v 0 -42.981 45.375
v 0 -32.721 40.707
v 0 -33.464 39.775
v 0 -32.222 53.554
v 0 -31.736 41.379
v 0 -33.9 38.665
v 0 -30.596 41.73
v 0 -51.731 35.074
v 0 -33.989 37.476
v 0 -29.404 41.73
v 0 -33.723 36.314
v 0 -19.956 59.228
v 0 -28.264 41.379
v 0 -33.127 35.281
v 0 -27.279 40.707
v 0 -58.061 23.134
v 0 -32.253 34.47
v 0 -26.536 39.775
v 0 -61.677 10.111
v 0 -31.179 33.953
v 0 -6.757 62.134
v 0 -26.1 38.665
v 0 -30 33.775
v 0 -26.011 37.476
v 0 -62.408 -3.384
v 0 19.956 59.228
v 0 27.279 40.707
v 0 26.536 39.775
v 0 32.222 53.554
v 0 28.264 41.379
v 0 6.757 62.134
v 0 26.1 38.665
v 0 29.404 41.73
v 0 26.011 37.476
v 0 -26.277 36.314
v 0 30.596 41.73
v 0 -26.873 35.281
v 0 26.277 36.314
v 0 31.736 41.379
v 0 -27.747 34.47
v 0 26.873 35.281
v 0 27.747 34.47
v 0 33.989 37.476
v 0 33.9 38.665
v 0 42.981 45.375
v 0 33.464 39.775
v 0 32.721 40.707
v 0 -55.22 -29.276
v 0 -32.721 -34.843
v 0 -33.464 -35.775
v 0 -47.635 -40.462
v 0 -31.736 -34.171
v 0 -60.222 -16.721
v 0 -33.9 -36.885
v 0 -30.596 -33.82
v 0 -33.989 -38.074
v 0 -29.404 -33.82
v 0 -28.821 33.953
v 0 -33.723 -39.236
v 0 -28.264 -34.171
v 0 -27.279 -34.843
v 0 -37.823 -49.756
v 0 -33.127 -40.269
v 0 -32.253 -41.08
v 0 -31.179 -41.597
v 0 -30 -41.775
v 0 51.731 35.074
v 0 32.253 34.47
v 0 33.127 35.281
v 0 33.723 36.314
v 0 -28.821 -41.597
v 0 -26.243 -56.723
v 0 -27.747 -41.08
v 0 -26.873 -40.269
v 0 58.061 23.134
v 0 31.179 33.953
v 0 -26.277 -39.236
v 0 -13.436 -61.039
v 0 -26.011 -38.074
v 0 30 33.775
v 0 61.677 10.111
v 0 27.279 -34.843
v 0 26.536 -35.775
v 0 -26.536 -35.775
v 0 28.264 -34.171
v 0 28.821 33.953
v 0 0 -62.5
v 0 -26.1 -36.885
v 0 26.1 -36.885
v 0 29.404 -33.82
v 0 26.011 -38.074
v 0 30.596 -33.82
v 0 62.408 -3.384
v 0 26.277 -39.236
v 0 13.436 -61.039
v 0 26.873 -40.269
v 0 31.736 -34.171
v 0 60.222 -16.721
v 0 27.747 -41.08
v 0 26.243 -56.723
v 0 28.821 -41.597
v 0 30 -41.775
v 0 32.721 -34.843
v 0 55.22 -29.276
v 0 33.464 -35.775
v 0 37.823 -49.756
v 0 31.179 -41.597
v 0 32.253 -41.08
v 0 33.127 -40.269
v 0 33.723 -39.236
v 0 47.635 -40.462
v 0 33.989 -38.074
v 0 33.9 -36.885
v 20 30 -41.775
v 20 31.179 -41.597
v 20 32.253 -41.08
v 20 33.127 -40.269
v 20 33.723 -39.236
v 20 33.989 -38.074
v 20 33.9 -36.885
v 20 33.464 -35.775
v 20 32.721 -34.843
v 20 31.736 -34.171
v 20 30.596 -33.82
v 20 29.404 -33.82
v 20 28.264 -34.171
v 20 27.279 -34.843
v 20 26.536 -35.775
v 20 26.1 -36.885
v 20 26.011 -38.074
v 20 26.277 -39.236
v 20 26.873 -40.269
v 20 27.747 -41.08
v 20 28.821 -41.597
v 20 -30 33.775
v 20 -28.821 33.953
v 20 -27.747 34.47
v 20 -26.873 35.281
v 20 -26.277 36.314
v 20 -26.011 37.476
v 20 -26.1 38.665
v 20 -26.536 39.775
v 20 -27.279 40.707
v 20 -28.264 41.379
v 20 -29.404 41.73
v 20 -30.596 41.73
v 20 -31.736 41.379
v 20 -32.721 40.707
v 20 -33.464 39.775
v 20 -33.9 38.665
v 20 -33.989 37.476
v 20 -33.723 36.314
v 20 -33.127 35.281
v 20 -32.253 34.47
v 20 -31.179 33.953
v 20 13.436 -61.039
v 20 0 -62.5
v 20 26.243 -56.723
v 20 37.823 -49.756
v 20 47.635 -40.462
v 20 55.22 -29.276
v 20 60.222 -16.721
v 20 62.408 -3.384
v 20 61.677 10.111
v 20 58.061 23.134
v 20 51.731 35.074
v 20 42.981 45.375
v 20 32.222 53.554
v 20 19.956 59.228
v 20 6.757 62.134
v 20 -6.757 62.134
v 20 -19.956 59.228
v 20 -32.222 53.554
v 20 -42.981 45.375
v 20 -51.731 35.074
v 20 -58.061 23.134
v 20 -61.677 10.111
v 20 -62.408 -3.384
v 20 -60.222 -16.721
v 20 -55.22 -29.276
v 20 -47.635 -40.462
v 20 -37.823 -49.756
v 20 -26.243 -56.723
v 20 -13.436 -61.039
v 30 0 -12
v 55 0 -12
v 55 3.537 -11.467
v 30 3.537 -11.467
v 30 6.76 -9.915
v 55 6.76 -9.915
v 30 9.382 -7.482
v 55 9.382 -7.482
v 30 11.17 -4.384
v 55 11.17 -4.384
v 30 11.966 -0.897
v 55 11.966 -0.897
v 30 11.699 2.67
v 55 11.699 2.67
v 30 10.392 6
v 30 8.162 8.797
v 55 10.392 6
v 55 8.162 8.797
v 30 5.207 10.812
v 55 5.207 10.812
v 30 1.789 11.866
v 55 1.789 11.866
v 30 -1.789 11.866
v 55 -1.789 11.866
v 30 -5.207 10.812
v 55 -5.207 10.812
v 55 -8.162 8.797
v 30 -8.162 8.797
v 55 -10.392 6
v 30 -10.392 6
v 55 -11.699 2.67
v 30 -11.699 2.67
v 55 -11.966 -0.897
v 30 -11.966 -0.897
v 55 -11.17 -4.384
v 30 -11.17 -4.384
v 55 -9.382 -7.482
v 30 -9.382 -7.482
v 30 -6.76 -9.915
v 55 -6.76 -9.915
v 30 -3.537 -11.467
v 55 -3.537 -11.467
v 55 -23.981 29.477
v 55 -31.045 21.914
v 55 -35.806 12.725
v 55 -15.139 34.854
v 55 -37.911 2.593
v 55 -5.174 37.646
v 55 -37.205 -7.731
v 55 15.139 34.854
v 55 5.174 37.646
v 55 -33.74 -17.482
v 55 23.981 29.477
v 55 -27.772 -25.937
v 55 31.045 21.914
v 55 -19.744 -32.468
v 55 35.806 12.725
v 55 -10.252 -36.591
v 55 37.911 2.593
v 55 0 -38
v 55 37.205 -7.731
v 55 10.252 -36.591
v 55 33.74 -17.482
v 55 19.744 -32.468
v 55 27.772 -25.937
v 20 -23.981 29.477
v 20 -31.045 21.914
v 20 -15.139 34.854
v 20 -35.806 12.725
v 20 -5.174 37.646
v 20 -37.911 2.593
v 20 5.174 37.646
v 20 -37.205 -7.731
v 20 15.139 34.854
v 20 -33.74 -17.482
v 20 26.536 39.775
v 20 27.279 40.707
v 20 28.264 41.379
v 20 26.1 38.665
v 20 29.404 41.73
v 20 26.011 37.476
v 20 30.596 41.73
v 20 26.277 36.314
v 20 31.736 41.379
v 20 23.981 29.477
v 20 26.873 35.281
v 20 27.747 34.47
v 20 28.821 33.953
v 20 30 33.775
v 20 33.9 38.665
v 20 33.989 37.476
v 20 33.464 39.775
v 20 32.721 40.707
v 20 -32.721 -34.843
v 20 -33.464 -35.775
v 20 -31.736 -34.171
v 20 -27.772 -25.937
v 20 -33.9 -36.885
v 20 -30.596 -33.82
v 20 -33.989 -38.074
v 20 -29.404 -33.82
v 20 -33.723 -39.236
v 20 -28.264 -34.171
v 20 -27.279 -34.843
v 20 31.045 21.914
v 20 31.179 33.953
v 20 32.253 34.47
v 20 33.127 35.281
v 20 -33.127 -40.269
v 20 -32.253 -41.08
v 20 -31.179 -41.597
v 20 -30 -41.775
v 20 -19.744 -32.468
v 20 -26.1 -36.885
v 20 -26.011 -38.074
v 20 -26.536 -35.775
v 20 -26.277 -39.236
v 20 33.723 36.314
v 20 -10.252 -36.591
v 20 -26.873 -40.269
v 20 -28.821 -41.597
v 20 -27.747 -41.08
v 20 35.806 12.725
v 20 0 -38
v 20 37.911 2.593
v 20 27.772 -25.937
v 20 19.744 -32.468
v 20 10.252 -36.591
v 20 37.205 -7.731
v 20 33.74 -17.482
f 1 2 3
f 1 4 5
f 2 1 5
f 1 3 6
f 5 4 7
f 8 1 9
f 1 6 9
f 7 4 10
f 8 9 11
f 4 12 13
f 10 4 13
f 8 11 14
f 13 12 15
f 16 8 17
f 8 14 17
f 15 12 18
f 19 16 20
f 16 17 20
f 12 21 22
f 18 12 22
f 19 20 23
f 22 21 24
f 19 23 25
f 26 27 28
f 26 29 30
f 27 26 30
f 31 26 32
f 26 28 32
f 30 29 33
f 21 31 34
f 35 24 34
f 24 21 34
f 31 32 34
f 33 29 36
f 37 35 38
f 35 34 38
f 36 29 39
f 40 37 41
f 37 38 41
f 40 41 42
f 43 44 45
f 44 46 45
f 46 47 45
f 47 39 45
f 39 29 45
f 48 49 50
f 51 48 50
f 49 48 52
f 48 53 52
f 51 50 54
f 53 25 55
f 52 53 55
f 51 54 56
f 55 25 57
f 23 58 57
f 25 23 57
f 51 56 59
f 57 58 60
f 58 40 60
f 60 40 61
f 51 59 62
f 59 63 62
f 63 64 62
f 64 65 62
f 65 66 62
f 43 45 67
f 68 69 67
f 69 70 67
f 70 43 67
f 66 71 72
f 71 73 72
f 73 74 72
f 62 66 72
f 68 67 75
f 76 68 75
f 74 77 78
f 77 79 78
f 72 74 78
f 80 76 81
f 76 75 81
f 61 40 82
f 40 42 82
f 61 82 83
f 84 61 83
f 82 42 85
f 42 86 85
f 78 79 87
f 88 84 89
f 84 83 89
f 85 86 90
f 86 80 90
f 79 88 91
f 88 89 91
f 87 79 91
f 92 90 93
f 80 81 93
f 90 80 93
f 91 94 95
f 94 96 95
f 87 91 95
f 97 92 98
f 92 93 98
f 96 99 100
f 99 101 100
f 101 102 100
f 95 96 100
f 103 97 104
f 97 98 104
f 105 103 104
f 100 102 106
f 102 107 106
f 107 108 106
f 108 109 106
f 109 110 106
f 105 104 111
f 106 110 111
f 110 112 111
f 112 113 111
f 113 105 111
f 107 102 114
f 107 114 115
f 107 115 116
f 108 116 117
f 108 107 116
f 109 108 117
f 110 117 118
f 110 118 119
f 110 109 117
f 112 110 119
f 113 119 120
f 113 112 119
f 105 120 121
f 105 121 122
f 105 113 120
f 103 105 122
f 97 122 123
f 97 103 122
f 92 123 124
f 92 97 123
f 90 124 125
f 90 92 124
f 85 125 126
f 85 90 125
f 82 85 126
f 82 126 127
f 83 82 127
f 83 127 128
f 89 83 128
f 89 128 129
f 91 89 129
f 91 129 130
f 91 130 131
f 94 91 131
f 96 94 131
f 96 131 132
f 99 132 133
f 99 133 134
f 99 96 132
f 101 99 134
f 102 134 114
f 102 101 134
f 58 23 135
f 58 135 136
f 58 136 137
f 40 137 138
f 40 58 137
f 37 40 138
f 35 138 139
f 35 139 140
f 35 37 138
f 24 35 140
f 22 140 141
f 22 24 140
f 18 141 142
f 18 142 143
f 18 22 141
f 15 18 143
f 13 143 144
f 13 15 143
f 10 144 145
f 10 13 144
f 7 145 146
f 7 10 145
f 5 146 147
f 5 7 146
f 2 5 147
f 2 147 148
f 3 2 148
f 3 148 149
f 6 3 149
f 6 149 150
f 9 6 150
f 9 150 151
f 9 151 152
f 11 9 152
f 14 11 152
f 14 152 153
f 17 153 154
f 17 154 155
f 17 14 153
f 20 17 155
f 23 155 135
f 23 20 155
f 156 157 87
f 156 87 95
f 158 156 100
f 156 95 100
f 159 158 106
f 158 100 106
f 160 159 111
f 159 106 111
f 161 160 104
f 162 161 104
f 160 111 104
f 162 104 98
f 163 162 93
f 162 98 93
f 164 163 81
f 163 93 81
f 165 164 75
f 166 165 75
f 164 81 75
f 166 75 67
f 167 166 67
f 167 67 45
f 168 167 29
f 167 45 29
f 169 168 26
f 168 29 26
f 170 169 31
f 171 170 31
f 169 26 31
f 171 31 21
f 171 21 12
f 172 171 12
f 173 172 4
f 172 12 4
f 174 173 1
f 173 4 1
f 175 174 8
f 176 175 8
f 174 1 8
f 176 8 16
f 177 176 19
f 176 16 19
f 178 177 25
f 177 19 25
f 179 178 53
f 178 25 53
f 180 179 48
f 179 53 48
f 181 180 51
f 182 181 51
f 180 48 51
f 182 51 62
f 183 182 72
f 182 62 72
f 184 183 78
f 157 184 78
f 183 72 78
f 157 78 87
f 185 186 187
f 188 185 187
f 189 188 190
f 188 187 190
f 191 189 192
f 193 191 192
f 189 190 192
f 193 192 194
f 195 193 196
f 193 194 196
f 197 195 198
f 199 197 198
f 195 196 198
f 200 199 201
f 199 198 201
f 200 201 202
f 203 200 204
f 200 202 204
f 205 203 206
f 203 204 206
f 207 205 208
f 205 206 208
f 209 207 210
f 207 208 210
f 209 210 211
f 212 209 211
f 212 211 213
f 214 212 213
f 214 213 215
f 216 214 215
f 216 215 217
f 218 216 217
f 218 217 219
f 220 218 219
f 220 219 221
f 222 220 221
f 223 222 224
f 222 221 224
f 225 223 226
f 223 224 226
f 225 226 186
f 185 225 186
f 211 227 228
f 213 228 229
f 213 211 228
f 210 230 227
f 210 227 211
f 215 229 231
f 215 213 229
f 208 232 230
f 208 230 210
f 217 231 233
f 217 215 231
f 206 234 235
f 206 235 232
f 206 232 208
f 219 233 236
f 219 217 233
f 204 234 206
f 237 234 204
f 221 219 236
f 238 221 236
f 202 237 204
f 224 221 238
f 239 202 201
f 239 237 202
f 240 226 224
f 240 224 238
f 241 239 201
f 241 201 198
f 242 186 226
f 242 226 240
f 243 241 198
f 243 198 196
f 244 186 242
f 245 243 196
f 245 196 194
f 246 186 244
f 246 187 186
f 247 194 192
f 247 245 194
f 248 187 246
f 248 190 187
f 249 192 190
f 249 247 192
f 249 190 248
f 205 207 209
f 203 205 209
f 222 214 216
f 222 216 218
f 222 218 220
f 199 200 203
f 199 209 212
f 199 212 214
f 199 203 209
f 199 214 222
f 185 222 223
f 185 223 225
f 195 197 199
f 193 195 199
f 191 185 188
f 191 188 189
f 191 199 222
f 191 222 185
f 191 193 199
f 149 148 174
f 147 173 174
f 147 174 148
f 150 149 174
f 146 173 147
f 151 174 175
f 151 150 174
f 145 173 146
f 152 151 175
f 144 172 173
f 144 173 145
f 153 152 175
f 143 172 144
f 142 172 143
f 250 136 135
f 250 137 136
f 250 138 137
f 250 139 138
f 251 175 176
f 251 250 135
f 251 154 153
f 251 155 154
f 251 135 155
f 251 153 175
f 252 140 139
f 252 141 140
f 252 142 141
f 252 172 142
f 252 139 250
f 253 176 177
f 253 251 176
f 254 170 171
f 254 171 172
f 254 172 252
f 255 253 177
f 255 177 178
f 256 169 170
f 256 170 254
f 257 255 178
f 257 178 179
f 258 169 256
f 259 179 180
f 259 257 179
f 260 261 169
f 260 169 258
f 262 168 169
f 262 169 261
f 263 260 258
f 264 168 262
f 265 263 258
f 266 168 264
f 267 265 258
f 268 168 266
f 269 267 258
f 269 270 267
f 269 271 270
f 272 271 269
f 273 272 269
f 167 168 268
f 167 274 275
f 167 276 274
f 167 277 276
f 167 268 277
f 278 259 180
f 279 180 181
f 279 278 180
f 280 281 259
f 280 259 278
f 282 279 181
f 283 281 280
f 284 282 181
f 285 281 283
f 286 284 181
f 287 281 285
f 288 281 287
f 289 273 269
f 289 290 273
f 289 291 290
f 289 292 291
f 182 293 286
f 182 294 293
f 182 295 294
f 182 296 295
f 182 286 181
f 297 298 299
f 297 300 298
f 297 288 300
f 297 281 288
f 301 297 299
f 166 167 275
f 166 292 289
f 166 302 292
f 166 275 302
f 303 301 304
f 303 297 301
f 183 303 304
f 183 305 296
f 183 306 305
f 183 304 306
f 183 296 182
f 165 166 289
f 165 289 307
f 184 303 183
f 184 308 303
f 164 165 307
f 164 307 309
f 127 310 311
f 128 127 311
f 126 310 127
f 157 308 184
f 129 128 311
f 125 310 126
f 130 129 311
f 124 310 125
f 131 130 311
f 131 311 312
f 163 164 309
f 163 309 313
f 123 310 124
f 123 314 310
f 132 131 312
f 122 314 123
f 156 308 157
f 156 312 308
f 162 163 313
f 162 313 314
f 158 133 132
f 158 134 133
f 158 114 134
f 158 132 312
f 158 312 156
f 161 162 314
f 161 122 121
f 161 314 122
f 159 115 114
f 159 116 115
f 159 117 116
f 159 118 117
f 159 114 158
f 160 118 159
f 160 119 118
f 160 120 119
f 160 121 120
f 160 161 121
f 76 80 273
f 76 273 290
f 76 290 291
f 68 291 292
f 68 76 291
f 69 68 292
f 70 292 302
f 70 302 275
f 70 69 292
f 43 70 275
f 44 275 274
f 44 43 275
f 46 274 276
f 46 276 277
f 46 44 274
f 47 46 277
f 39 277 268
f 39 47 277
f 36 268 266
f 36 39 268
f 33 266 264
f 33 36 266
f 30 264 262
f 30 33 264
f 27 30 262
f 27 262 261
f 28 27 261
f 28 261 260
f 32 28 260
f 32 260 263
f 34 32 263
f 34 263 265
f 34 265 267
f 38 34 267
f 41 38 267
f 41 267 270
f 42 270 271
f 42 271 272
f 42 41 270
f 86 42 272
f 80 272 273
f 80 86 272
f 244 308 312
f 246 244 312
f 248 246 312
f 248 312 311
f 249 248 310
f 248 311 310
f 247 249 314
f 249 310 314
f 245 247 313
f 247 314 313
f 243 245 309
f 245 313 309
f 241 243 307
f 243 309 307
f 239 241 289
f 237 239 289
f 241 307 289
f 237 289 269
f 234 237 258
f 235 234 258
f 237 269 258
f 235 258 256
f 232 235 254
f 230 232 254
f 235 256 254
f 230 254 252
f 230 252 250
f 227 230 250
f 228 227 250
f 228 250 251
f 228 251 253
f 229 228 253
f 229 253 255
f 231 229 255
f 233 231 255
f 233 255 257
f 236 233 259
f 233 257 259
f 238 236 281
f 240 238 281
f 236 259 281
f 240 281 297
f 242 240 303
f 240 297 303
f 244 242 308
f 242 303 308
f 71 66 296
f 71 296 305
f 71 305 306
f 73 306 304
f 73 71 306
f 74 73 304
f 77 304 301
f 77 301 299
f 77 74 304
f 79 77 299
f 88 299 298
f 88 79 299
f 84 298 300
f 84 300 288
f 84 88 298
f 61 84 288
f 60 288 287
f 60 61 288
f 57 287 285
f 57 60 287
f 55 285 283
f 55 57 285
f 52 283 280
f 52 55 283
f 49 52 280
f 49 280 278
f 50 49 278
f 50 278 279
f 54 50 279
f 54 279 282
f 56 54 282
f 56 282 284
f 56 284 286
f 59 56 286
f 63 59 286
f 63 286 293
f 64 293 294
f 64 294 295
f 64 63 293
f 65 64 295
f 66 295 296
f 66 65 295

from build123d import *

# Parameters (mm, degrees)
ESBO_O1_R                = 62.5
ESBO_O1_R_2              = 4
RESSALTO_EXTRUS_O1_DEPTH = 20
ESBO_O2_R                = 38
RESSALTO_EXTRUS_O2_DEPTH = 35
ESBO_O4_R                = 12
CORTE_EXTRUS_O1_DEPTH    = 25


with BuildPart() as part:
    # Esboço1 → Ressalto-extrusão1 (new body)
    with BuildSketch(Plane(origin=(0, 0, 0), x_dir=(0, 0, -1), z_dir=(1, 0, 0))):
        Circle(ESBO_O1_R)
        with Locations((37.775, 30)):
            Circle(ESBO_O1_R_2, mode=Mode.SUBTRACT)
        with Locations((-37.775, 30)):
            Circle(ESBO_O1_R_2, mode=Mode.SUBTRACT)
        with Locations((37.775, -30)):
            Circle(ESBO_O1_R_2, mode=Mode.SUBTRACT)
        with Locations((-37.775, -30)):
            Circle(ESBO_O1_R_2, mode=Mode.SUBTRACT)
    extrude(amount=RESSALTO_EXTRUS_O1_DEPTH)

    # Esboço2 → Ressalto-extrusão2 (add)
    with BuildSketch(Plane(origin=(20, 0, 0), x_dir=(0, 0, -1), z_dir=(1, 0, 0))):
        Circle(ESBO_O2_R)
    extrude(amount=RESSALTO_EXTRUS_O2_DEPTH)

    # Esboço4 → Corte-extrusão1 (cut)
    with BuildSketch(Plane(origin=(55, 0, 0), x_dir=(0, 0, -1), z_dir=(1, 0, 0))):
        Circle(ESBO_O4_R)
    extrude(amount=-CORTE_EXTRUS_O1_DEPTH, mode=Mode.SUBTRACT)


solid = part.part
